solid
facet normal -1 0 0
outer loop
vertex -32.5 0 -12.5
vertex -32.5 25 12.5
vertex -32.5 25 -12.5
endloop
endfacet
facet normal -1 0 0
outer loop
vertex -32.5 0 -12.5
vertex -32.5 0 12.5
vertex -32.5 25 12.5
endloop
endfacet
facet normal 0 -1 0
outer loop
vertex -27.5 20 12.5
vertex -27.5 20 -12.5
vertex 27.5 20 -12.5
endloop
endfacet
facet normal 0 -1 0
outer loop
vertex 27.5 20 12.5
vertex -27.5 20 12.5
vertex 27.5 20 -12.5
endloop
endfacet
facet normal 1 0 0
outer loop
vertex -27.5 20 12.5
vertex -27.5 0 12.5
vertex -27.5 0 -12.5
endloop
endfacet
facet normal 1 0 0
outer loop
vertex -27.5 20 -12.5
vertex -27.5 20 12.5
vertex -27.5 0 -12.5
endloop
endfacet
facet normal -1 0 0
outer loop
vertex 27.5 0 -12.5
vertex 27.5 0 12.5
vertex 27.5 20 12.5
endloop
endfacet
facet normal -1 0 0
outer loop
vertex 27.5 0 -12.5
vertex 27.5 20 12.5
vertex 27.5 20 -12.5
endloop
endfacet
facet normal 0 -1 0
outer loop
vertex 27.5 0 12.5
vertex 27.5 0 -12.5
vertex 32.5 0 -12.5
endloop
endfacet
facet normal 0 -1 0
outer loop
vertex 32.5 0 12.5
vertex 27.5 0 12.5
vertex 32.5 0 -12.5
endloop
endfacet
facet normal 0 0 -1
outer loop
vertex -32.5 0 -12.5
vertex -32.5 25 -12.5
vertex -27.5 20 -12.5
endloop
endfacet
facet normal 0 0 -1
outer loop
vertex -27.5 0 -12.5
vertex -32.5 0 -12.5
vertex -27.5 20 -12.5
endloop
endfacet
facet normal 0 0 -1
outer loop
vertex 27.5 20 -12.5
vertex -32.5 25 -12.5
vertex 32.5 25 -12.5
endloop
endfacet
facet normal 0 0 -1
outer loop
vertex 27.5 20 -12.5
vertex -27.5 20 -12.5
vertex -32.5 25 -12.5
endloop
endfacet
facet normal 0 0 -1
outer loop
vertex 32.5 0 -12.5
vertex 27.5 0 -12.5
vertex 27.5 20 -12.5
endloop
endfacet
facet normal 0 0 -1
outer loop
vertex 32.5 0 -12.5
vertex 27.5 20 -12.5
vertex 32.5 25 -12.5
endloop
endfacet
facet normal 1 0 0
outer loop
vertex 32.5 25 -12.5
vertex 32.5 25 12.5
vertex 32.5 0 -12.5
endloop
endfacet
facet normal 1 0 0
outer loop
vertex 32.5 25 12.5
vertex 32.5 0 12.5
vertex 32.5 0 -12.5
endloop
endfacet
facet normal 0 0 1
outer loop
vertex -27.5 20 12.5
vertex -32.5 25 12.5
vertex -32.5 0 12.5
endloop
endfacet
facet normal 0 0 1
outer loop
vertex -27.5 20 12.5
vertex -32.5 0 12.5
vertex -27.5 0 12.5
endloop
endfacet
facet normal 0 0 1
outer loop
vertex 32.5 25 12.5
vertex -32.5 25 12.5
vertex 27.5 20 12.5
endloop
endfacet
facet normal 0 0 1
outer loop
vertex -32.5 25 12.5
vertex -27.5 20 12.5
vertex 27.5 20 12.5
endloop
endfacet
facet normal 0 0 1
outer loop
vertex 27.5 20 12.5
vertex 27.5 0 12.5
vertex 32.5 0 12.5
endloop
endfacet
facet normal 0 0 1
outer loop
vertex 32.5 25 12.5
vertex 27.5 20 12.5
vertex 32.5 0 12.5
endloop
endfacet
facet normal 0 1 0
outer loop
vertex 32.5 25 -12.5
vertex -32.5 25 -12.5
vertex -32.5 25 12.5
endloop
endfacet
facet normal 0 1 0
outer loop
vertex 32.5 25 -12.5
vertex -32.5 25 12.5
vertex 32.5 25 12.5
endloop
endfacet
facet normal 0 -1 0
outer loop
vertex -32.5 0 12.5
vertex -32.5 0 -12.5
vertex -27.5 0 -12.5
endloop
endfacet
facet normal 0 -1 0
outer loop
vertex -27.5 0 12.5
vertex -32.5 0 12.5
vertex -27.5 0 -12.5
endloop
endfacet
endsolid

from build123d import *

# Parameters (mm, degrees)
SKETCH_1_W        = 5
SKETCH_1_H        = 25
EXTRUDE_1_DEPTH   = 20
EXTRUDE_1_2_DEPTH = 20
SKETCH_2_W        = 65
SKETCH_2_H        = 25
EXTRUDE_2_DEPTH   = 5


with BuildPart() as part:
    # ｽｹｯﾁ1 → ﾎﾞｽ - 押し出し1 (new body)
    with BuildSketch(Plane(origin=(0, 0, 0), x_dir=(1, 0, 0), z_dir=(0, 1, 0))):
        with Locations((30, 0)):
            Rectangle(SKETCH_1_W, SKETCH_1_H)
    extrude(amount=EXTRUDE_1_DEPTH)



with BuildPart() as body_2:
    # ｽｹｯﾁ1 → Extrude 1 2 (new body)
    with BuildSketch(Plane(origin=(0, 0, 0), x_dir=(1, 0, 0), z_dir=(0, 1, 0))):
        with Locations((-30, 0)):
            Rectangle(SKETCH_1_W, SKETCH_1_H)
    extrude(amount=EXTRUDE_1_2_DEPTH)


with BuildPart() as part_1:
    add(part.part)

    add(body_2.part)  # ﾎﾞｽ - 押し出し2 merges body 2
    # ｽｹｯﾁ2 → ﾎﾞｽ - 押し出し2 (add)
    with BuildSketch(Plane(origin=(0, 20, 0), x_dir=(1, 0, 0), z_dir=(0, 1, 0))):
        Rectangle(SKETCH_2_W, SKETCH_2_H)
    extrude(amount=EXTRUDE_2_DEPTH)


solid = part_1.part
